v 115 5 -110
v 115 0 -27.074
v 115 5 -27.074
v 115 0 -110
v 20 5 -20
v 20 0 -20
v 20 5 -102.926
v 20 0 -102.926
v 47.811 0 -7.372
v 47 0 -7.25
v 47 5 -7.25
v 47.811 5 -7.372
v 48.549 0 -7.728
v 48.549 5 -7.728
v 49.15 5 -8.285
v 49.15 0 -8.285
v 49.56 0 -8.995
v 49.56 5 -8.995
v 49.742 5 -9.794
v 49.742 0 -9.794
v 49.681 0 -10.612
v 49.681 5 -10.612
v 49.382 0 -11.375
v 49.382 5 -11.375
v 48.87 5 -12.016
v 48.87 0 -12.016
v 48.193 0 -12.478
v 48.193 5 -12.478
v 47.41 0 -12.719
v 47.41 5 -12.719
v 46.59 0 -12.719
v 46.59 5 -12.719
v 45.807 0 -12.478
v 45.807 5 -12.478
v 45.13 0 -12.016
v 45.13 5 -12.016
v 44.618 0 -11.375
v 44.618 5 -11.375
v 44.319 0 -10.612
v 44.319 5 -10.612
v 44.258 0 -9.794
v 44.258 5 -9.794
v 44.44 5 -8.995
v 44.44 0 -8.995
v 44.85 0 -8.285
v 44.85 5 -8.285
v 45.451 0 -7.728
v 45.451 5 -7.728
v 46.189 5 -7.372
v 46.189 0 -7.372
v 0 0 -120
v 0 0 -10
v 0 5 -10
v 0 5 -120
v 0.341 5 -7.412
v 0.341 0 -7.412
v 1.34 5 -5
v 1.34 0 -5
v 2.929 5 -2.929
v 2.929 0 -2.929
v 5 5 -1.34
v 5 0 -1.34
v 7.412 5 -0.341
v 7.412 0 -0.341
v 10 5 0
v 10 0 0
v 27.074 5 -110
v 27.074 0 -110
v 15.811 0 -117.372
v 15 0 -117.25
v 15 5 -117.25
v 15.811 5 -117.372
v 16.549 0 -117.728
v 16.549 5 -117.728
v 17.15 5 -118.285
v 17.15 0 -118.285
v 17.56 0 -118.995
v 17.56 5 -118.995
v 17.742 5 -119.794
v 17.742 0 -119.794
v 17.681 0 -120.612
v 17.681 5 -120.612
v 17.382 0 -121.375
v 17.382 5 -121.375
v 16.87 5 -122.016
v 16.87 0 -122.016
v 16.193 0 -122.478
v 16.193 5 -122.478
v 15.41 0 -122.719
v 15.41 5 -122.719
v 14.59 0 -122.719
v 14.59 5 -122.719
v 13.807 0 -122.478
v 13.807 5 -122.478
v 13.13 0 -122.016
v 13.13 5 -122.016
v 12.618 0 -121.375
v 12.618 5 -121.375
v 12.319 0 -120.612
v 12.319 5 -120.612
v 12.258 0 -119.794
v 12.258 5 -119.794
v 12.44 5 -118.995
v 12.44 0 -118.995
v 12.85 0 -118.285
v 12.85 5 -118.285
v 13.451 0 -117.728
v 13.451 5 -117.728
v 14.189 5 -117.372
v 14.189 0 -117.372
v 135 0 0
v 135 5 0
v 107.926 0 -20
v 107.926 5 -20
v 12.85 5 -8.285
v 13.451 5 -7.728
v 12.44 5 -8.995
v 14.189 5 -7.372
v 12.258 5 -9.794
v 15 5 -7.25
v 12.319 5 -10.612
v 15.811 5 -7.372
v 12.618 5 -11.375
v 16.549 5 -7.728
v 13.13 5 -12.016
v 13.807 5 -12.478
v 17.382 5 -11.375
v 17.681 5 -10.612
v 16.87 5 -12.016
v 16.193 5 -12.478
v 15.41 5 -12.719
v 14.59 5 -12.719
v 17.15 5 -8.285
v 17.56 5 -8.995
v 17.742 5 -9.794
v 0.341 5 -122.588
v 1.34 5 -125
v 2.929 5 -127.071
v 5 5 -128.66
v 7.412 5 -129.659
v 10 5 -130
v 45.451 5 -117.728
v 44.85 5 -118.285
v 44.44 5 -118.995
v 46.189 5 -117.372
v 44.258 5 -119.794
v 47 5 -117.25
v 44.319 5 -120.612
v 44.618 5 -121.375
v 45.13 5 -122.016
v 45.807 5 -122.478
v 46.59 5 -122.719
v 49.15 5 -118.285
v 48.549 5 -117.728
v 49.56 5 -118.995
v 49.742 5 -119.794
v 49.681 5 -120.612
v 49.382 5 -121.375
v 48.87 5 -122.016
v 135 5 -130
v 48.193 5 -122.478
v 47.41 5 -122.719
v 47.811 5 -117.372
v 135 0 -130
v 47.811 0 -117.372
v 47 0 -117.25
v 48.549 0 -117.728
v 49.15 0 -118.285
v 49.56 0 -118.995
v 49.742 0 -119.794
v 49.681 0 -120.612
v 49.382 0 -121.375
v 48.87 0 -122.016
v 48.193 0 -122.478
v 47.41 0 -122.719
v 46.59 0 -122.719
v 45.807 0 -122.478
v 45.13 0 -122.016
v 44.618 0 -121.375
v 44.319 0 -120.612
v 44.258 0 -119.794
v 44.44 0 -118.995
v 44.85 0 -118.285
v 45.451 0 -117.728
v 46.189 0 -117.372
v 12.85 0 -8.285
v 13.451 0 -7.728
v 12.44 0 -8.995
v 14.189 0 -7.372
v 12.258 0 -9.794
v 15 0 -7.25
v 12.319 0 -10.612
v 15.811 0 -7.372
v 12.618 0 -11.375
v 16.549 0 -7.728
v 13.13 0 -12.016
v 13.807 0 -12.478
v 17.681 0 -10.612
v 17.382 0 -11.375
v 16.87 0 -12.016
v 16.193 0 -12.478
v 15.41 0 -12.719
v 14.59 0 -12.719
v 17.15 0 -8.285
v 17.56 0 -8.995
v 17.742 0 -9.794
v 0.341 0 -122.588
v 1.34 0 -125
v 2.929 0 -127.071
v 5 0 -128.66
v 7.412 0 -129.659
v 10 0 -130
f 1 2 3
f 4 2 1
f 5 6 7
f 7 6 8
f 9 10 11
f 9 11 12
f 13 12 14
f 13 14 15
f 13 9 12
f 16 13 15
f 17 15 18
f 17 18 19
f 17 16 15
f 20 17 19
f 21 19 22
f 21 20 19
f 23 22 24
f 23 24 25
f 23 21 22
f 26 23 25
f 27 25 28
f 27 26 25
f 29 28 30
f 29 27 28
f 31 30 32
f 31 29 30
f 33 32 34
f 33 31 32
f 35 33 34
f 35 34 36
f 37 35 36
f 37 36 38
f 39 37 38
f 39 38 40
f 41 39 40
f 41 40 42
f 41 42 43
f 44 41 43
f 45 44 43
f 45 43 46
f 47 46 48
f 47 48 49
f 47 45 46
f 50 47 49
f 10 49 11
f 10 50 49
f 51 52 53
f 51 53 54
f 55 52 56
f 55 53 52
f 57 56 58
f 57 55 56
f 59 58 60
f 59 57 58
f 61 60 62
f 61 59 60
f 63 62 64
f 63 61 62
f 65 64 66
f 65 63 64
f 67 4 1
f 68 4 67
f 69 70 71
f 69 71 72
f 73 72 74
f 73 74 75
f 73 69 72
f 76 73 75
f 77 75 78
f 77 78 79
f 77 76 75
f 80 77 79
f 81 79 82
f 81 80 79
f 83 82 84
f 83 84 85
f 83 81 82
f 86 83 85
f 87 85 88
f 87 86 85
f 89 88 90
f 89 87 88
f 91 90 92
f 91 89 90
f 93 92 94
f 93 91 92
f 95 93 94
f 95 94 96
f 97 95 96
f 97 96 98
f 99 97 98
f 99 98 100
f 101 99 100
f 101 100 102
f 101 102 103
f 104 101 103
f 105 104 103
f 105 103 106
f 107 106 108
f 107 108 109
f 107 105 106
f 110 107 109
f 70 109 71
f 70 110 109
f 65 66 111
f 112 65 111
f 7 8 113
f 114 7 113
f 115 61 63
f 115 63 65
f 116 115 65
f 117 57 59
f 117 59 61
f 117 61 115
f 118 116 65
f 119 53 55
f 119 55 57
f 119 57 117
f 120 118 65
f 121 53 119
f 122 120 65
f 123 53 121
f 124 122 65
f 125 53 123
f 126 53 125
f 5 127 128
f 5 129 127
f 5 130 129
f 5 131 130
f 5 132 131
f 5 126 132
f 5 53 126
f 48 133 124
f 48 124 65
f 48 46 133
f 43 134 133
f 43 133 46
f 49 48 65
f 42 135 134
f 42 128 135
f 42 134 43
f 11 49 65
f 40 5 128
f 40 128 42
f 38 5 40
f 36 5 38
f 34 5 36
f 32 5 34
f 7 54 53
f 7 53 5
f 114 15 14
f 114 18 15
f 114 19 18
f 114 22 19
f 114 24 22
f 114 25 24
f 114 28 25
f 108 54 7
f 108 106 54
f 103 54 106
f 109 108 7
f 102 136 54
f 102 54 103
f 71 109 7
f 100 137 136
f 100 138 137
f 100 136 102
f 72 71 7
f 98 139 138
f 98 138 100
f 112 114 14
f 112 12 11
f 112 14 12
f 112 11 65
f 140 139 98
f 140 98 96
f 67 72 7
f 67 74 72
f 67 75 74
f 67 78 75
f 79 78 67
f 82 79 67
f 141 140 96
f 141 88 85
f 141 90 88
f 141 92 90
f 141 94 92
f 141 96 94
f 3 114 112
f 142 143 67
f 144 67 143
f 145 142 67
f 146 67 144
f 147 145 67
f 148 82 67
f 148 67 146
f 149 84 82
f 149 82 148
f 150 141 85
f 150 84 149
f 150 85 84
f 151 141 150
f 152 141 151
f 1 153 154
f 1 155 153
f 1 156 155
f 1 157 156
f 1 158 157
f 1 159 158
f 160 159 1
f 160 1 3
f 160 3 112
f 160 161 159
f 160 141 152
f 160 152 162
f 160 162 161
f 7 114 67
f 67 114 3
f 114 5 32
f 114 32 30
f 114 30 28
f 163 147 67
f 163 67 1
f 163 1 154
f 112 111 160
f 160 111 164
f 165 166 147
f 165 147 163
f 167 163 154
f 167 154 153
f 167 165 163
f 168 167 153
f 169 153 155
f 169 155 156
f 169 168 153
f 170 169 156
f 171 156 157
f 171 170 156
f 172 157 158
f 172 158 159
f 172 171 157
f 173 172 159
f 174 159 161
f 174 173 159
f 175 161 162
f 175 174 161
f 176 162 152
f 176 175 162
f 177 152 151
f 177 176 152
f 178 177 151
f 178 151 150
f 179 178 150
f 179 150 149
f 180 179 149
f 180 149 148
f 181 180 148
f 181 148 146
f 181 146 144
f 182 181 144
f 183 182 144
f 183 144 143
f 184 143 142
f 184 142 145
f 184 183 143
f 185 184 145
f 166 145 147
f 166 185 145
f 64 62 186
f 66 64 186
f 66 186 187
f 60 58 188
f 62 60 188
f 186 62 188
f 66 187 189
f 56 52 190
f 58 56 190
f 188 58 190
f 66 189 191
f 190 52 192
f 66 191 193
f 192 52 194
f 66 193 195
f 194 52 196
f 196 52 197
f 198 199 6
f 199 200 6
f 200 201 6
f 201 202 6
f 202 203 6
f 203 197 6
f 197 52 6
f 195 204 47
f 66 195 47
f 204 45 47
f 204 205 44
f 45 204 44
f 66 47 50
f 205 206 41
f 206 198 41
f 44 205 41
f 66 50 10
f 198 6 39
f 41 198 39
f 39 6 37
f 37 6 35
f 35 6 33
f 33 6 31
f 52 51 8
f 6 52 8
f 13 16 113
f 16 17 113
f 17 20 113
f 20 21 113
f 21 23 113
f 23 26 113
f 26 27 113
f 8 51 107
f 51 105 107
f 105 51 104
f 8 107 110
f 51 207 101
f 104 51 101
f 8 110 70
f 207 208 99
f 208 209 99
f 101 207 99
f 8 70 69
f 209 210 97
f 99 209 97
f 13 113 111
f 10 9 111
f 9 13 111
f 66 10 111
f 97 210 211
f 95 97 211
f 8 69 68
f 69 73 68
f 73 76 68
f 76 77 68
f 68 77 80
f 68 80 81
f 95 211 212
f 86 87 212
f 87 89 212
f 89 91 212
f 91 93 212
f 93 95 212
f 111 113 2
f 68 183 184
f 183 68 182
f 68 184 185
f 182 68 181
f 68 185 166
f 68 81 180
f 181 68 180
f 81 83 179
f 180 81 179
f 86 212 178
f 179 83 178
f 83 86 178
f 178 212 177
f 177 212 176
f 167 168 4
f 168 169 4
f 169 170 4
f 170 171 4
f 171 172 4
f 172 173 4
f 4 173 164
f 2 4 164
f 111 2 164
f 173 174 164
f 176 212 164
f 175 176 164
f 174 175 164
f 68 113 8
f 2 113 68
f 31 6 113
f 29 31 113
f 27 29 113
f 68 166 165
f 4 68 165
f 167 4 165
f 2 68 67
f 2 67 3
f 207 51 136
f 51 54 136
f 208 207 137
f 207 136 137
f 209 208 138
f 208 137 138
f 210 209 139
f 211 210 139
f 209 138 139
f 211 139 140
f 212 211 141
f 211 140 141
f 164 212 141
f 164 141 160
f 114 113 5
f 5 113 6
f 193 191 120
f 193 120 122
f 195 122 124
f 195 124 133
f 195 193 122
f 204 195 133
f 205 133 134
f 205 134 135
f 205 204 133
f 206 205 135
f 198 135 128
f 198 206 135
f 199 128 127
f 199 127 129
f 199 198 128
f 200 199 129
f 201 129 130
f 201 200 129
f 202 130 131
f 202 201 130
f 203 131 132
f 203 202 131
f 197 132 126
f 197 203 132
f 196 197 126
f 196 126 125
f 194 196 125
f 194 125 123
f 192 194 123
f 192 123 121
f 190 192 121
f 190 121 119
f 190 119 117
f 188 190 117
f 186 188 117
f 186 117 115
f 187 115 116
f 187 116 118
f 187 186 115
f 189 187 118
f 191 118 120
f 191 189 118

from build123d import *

# Parameters (mm, degrees)
SKETCH1_W           = 135
SKETCH1_H           = 130
SKETCH1_R           = 2.75
BOSS_EXTRUDE2_DEPTH = 5
FILLET1_R           = 10


with BuildPart() as part:
    # Sketch1 → Boss-Extrude2 (new body)
    with BuildSketch(Plane(origin=(0, 0, 0), x_dir=(1, 0, 0), z_dir=(0, 1, 0))):
        with Locations((67.5, 65)):
            Rectangle(SKETCH1_W, SKETCH1_H)
        with Locations(Location((15, 10, 0), (0, 0, 270))):
            Circle(SKETCH1_R, mode=Mode.SUBTRACT)
        with Locations(Location((47, 10, 0), (0, 0, 270))):
            Circle(SKETCH1_R, mode=Mode.SUBTRACT)
        with Locations(Location((15, 120, 0), (0, 0, 270))):
            Circle(SKETCH1_R, mode=Mode.SUBTRACT)
        with Locations(Location((47, 120, 0), (0, 0, 270))):
            Circle(SKETCH1_R, mode=Mode.SUBTRACT)
        Polygon((20, 102.925904836), (107.925904836, 20), (20, 20), align=None, mode=Mode.SUBTRACT)
        Polygon((27.074095164, 110), (115, 27.074095164), (115, 110), align=None, mode=Mode.SUBTRACT)
    extrude(amount=BOSS_EXTRUDE2_DEPTH)

    # Fillet1
    fillet1_edges = [part.edges().sort_by_distance(p)[0] for p in [
        (0, 2.5, 0),
        (0, 2.5, -130),
    ]]
    fillet(fillet1_edges, radius=FILLET1_R)


solid = part.part
